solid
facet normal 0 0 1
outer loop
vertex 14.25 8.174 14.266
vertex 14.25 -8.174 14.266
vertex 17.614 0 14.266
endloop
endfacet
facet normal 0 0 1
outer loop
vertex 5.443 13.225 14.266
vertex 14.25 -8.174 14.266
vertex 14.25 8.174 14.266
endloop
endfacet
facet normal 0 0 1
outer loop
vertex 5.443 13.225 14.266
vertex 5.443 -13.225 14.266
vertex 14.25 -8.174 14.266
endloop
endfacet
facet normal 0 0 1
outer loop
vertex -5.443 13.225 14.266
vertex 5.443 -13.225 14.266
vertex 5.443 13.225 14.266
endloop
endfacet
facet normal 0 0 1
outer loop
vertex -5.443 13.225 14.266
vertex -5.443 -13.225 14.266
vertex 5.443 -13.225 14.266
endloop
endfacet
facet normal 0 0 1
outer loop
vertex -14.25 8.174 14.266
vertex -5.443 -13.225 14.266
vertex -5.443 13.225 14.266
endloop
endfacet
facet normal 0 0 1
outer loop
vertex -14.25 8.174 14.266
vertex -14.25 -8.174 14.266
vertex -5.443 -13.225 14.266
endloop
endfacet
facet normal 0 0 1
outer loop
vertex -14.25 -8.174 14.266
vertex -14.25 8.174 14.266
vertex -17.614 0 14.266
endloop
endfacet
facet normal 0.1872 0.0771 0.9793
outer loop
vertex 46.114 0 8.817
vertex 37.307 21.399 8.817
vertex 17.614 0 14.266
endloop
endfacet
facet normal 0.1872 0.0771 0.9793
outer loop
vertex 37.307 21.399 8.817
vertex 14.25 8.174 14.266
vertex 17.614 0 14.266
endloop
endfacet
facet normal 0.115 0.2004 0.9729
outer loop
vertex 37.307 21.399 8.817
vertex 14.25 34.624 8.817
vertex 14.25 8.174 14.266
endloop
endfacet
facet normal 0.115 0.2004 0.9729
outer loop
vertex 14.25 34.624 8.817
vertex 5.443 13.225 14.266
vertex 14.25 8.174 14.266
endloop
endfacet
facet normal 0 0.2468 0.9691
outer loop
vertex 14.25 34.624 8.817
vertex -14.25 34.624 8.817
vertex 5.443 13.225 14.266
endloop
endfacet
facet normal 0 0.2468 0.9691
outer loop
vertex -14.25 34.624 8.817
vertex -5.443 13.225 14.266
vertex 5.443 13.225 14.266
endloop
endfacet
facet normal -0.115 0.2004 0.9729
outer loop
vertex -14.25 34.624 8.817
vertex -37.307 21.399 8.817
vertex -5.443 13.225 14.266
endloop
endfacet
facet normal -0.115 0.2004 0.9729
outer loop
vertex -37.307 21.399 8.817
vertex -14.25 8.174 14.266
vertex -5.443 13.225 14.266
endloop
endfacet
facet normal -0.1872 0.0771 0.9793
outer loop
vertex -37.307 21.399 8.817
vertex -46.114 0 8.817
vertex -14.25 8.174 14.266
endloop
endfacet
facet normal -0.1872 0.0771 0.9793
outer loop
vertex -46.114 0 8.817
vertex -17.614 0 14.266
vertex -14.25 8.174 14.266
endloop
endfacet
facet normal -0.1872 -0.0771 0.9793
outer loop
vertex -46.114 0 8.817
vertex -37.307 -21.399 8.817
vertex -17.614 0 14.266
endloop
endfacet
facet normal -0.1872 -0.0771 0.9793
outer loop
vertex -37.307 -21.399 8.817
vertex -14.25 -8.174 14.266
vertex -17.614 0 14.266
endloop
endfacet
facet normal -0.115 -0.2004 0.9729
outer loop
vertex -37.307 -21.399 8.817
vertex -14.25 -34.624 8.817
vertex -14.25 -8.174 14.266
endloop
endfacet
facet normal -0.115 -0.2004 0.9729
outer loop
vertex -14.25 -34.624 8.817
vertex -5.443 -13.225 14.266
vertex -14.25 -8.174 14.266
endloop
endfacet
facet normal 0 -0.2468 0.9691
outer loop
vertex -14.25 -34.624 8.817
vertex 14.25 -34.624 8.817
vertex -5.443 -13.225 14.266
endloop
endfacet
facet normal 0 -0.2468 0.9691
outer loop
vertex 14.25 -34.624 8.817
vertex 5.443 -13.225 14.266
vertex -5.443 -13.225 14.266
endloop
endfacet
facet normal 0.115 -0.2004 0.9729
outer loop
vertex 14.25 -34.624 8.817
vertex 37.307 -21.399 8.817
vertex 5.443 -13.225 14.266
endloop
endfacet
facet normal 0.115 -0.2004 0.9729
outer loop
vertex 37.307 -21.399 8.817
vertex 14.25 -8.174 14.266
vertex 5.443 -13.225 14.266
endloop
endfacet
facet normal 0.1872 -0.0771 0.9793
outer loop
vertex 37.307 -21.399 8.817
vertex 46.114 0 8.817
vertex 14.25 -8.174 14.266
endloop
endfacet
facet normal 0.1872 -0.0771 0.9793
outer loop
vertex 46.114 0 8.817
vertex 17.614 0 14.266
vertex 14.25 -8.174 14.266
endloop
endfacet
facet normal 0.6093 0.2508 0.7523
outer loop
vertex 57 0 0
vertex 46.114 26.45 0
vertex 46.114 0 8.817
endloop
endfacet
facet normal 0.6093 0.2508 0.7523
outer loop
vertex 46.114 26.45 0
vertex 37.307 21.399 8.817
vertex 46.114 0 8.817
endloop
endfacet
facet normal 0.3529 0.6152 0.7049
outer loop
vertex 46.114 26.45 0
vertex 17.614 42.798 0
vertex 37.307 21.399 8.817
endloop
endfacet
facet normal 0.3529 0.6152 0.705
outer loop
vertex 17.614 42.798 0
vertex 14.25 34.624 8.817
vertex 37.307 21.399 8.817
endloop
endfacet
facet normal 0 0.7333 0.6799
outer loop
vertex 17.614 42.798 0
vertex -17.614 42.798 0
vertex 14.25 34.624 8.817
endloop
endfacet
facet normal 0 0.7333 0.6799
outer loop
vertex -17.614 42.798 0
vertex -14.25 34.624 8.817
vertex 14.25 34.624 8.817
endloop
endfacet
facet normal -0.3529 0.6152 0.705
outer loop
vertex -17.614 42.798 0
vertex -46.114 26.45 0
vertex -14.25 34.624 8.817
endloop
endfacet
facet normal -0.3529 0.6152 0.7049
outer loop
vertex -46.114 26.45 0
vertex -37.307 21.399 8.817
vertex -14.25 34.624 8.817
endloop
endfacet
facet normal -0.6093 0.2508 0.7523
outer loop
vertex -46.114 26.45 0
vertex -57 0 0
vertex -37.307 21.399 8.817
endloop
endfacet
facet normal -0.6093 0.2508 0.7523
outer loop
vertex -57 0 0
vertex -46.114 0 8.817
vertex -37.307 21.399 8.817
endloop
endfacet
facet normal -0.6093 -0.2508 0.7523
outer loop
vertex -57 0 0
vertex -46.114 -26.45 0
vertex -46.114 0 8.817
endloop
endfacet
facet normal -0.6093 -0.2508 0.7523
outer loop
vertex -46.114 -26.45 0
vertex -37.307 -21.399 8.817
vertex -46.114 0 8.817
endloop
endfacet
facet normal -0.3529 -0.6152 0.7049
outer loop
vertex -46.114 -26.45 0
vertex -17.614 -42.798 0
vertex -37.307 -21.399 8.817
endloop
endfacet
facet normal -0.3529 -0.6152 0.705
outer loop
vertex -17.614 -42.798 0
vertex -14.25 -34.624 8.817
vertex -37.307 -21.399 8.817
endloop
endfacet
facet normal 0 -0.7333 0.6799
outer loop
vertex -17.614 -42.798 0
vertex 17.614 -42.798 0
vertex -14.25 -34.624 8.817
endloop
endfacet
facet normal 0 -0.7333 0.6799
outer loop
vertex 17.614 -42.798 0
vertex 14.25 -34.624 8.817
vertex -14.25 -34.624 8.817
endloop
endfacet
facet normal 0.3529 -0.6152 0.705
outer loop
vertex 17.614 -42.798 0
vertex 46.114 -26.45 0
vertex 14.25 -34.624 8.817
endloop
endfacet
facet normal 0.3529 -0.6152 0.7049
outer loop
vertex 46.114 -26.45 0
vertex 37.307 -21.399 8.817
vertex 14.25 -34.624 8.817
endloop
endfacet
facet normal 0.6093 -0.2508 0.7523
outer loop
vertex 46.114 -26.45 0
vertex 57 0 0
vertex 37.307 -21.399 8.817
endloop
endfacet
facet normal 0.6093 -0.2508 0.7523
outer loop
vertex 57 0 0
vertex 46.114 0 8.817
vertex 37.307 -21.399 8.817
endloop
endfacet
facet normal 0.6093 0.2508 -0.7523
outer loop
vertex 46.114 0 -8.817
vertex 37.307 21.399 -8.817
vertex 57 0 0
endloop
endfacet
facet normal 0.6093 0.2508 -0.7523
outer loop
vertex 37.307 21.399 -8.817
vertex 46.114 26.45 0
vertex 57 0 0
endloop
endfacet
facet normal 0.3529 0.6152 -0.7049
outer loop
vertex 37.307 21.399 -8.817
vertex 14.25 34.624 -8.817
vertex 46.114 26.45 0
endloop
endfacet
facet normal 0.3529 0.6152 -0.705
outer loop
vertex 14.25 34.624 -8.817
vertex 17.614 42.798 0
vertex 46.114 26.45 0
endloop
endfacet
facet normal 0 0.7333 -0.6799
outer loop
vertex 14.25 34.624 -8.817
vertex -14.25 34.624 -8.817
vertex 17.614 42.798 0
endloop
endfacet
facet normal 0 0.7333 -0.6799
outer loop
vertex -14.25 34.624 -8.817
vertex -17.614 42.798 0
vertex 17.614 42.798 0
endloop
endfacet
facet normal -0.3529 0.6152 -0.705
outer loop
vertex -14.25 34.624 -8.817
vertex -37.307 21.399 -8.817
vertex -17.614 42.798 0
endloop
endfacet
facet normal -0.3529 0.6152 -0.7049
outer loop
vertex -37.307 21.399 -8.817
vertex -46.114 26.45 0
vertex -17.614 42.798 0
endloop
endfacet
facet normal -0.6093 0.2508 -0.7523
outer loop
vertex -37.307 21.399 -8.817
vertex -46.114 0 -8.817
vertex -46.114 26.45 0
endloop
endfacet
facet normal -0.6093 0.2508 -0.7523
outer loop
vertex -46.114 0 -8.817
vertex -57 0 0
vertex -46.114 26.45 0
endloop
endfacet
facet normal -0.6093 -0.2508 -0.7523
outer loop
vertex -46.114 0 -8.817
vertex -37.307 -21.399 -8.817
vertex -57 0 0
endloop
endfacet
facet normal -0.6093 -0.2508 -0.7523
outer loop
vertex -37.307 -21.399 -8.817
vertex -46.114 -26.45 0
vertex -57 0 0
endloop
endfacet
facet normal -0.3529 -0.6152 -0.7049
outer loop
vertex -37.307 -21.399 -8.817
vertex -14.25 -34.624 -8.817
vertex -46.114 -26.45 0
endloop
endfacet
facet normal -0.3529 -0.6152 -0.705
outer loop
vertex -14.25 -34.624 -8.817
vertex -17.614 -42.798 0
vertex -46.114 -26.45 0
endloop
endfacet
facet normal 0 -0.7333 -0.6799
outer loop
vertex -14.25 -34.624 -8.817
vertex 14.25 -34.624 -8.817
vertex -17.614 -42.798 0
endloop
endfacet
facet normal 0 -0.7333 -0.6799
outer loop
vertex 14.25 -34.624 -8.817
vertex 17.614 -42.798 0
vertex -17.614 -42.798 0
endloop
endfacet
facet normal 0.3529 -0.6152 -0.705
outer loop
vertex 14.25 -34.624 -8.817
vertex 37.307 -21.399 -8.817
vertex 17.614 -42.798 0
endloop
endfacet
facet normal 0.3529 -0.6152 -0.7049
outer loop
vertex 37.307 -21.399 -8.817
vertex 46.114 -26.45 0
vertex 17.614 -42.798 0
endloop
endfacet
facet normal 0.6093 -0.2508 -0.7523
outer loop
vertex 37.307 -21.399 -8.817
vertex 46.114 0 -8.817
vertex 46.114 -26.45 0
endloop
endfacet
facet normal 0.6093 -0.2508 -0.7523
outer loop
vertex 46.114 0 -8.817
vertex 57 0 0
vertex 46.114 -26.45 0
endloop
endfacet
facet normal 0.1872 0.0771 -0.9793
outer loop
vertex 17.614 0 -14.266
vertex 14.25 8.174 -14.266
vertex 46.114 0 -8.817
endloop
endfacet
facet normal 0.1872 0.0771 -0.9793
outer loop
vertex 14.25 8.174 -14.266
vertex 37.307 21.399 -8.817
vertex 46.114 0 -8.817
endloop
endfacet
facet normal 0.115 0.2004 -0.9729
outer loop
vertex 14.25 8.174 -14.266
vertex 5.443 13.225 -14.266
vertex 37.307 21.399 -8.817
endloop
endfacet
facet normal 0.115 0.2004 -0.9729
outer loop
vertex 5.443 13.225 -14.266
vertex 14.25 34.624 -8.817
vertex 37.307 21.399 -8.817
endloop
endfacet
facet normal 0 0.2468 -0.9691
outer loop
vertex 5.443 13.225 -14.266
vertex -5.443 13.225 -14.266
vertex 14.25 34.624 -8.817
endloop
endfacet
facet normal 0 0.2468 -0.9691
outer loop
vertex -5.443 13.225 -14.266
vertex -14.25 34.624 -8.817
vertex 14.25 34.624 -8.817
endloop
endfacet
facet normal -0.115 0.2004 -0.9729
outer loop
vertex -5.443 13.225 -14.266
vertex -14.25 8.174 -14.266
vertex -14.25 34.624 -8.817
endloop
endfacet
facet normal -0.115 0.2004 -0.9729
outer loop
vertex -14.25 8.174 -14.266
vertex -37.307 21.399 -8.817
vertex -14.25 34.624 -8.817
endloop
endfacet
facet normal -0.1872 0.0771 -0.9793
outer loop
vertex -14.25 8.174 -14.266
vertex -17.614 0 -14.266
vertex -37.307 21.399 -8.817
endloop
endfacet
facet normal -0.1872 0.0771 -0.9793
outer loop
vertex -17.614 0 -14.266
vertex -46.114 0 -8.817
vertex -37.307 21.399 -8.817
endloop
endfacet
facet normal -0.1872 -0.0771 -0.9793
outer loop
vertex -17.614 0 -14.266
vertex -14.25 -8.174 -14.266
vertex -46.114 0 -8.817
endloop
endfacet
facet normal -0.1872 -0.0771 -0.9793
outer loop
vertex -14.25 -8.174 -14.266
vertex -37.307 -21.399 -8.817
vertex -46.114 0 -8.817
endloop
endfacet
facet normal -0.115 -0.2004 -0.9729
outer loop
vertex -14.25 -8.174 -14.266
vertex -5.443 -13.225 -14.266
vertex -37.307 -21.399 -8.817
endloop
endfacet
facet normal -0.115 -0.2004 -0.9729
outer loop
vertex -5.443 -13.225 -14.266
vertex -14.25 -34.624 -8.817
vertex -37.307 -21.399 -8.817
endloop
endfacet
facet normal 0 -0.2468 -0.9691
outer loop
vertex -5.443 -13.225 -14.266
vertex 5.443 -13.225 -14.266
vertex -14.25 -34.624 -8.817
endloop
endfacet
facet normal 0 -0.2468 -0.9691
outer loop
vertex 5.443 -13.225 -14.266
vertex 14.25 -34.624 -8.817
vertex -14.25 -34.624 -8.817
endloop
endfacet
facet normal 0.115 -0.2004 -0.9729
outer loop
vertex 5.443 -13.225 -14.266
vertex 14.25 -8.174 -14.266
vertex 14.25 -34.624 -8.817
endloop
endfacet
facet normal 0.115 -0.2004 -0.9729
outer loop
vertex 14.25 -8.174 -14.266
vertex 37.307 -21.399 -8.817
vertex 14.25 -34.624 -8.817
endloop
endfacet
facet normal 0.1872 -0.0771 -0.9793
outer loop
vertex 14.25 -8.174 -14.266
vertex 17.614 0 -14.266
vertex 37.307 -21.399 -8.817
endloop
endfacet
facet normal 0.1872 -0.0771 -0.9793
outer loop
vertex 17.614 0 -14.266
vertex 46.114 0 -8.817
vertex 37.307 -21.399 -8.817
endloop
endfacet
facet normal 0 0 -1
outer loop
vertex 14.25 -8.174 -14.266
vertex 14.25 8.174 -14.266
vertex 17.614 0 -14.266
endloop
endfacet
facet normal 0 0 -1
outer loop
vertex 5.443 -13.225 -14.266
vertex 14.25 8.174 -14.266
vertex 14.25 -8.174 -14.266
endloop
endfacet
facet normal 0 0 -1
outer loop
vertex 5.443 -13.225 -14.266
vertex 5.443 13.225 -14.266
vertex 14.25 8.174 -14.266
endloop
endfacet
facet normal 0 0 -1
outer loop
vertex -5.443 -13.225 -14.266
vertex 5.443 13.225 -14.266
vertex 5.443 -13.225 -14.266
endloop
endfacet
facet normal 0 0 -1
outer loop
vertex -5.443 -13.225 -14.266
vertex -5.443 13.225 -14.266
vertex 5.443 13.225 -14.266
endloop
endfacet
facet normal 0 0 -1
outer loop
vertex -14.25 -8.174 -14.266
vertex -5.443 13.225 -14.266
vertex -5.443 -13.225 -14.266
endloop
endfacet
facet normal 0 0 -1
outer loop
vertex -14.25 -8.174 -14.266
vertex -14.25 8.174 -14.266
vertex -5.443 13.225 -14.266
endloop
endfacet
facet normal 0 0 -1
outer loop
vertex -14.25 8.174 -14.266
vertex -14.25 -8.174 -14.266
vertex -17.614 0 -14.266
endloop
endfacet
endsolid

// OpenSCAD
// Generated by SolidPython 1.0.1 on 2020-07-29 00:46:54


scale(v = [19, 15, 5]) {
	sphere(r = 3);
}
/***********************************************
*********      SolidPython code:      **********
************************************************
 
# import packages: SolidPython
from solid import *
from solid.utils import *
from itertools import chain, combinations, permutations


class Resize:

    def __init__(self, scad_file):
        self.scad_file = scad_file
        #self.scad_file = import_scad(scad_file)
        # cone/cylinder param:
        self.r1 = 0
        self.r2 = 0
        self.h = 0
        # rectangular prism param:
        self.w = 0
        self.l = 0
        # ellipse param:
        self.r = 0

    # import OpenScad code (file name corresponds to shape)


    # classify shape + parameters
    def assign(self, param1, param2, param3):
        if self.scad_file == 'cone.scad':
            self.r1 = param1
            self.r2 = param2
            self.h = param3
        elif self.scad_file == 'cylinder.scad':
            self.r1 = param1
            self.r2 = param2
            self.h = param3
        elif self.scad_file == 'rectangularPrism.scad':
            self.h = param1
            self.l = param2
            self.w = param3
        else:
            self.r = param1
            self.h = param2

    # resize parameters
    def iterate(self):
        x = range(3, 20, 2)
        i = 1
        if self.scad_file == 'cone.scad':
            tempList = list(permutations(x, 2))
            for temp in tempList:
                param1 = temp[0]
                param2 = temp[1]
                filepath = 'produced_scad_files/' + 'cone' + str(param1) + '_' + str(param2) + '_' + '.scad'
                scad_render_to_file(cylinder(h=param1, r1=param2, r2=0), filepath)

        elif self.scad_file == 'cylinder.scad':
            tempList = list(permutations(x, 3))
            for temp in tempList:
                param1 = temp[0]
                param2 = temp[1]
                filepath = 'produced_scad_files/' + 'cylinder' + str(param1) + '_' + str(param2) + '_' + '.scad'
                scad_render_to_file(cylinder(h=param1, r1=param2, r2=param2), filepath)

        elif self.scad_file == 'rectangularPrism.scad':
            tempList = list(permutations(x, 3))
            for temp in tempList:
                param1 = temp[0]
                param2 = temp[1]
                param3 = temp[2]
                filepath = 'produced_scad_files/' + 'rectangularPrism' + str(param1) + '_' + str(param2) + '_' + str(
                    param3) + '.scad'
                scad_render_to_file(cube(size=(param1, param2, param3)), filepath)

        elif self.scad_file == 'ellipse.scad':
            tempList = list(permutations(x, 4))
            for temp in tempList:
                param1 = temp[0]
                param2 = temp[1]
                param3 = temp[2]
                param4 = temp[3]
                filepath = 'produced_scad_files/' + 'ellipse' + str(param1) + '_' + str(param2) + '_' + str(param3) + '_' + str(param4) + '.scad'
                scad_render_to_file(scale([param1, param2, param3])(sphere(r=param4)), filepath)

    def render_to_scadfile(self):
        scad_render_to_file(scad, 'example.scad') 
 
************************************************/
